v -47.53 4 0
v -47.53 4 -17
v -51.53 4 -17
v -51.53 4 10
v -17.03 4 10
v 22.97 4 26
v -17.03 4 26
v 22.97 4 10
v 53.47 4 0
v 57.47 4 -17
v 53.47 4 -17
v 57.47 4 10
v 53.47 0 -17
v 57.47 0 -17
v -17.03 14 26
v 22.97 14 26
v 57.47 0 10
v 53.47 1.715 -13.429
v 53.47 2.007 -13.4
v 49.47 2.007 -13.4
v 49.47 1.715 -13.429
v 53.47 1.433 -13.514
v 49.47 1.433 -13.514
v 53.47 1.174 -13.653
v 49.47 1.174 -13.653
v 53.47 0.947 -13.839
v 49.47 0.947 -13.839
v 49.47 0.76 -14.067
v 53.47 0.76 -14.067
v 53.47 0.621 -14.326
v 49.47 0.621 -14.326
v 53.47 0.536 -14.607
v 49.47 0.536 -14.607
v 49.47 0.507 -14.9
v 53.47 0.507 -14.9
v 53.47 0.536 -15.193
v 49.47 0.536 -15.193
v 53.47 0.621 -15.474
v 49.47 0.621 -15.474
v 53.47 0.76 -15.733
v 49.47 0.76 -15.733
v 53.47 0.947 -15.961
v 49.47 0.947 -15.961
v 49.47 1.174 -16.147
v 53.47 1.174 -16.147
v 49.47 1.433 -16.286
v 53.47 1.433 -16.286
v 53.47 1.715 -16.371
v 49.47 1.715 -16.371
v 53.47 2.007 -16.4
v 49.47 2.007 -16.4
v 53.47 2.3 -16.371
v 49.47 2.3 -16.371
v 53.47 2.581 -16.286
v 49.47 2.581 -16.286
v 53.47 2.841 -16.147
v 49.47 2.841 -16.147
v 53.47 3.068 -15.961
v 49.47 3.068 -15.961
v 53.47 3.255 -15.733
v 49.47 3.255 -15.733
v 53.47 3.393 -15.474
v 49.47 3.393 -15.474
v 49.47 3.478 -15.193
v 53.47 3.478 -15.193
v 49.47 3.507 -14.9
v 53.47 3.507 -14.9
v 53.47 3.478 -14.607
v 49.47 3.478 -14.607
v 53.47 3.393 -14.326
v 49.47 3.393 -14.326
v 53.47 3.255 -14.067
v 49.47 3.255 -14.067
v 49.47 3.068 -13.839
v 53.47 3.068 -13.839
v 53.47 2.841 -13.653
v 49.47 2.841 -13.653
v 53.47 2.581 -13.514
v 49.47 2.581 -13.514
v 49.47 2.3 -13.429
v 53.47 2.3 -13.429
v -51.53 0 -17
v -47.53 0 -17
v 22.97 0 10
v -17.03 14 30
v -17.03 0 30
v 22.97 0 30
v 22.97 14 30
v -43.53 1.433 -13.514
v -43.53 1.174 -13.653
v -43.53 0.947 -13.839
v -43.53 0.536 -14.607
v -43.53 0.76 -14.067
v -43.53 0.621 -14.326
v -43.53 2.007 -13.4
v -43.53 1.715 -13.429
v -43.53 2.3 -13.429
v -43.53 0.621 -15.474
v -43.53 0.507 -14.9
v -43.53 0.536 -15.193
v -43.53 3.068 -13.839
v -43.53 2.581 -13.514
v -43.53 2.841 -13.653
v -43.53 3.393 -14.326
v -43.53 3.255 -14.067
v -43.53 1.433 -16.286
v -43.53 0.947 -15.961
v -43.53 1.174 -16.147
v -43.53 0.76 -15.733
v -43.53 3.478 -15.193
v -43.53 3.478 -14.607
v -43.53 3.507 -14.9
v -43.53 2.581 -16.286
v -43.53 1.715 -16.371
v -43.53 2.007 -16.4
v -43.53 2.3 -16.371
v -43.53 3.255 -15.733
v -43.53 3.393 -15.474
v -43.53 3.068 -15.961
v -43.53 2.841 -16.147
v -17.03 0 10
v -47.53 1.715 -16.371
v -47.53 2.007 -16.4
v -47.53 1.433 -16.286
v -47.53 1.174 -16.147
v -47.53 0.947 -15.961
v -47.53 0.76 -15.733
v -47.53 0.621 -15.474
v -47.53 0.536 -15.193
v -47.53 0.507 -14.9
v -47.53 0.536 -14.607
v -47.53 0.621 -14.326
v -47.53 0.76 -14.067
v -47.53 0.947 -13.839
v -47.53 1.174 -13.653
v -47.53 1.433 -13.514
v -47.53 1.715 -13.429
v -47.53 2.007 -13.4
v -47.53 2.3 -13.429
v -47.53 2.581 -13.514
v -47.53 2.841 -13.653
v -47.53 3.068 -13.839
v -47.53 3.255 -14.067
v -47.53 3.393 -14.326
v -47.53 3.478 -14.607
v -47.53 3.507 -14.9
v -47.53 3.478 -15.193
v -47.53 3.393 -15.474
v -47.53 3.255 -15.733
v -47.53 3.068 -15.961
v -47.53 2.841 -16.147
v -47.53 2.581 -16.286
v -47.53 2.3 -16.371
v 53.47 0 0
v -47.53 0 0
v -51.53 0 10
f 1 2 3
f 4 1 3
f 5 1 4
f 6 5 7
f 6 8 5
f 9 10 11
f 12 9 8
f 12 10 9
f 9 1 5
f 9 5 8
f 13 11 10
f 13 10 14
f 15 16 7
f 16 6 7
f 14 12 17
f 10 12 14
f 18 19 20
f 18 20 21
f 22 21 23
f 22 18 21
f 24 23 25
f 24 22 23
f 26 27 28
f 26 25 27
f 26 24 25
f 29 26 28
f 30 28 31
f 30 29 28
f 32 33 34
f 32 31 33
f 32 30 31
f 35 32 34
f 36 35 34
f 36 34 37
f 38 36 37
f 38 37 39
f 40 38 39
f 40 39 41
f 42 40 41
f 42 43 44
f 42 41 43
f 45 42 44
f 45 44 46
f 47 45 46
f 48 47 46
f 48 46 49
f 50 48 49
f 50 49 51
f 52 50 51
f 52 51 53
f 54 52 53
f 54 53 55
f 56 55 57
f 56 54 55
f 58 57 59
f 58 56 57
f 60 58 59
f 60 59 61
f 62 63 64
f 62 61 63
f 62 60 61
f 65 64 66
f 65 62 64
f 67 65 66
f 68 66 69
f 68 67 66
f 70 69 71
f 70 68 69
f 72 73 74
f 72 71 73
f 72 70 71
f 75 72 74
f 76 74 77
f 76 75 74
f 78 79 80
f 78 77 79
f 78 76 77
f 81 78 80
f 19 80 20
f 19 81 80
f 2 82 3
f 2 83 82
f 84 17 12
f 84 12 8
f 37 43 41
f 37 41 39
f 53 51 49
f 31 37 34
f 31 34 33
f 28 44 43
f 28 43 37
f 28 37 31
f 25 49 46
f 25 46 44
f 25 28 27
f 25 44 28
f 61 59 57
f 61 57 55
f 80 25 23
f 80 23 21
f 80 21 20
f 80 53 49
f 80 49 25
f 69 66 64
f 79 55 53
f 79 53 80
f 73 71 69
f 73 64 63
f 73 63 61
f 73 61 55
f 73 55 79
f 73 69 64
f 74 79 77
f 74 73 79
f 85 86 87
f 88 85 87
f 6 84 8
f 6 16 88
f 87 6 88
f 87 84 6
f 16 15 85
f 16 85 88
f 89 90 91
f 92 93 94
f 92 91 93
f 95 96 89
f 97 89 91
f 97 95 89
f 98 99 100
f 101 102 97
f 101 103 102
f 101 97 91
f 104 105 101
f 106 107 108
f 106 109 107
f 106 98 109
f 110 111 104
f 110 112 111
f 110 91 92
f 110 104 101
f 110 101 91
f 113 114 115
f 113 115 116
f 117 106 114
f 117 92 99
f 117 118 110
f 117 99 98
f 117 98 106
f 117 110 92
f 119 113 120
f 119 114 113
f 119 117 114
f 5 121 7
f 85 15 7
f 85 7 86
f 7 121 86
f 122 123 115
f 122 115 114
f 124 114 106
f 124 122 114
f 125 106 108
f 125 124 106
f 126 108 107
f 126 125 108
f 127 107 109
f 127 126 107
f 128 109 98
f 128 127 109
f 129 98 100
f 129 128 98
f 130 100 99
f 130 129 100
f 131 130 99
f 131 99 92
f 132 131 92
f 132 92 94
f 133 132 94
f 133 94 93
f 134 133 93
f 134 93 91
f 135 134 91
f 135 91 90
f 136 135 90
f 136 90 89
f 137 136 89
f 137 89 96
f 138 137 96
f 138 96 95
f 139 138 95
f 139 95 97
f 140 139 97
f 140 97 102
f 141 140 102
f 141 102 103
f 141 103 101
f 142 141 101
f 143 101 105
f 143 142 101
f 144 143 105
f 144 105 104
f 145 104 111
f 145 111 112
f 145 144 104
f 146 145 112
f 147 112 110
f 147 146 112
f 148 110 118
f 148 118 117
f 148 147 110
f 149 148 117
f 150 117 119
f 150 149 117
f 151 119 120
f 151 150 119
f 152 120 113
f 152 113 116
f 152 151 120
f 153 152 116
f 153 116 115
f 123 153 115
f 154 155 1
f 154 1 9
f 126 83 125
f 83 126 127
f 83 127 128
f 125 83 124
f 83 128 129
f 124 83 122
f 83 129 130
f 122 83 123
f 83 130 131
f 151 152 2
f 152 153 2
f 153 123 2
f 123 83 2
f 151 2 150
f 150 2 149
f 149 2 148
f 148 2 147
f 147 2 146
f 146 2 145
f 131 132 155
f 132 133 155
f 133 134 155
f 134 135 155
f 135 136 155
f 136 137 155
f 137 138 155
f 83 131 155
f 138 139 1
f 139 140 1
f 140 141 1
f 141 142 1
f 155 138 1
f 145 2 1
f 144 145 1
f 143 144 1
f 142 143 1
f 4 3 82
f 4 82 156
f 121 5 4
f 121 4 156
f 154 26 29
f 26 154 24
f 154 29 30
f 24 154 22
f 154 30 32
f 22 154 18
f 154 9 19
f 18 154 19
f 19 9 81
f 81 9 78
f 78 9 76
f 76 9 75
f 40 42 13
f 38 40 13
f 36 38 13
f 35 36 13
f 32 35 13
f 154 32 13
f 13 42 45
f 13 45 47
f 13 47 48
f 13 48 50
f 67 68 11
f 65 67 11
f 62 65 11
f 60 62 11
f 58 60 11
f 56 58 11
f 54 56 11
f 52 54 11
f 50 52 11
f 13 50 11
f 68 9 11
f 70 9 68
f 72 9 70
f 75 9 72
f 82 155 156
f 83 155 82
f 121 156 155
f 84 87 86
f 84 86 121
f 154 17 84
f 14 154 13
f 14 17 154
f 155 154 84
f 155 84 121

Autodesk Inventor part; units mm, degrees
ref_plane "YZ Plane" through (0, 0, 0) normal (1, 0, 0) x (0, 1, 0)
ref_plane "XZ Plane" through (0, 0, 0) normal (0, 1, 0) x (-1, 0, 0)
ref_plane "XY Plane" through (0, 0, 0) normal (0, 0, 1) x (1, 0, 0)
sketch "Эскиз1" plane through (0, 0, 0) normal (0, 1, 0) x (-1, 0, 0)
  line L0 (0, 0) -> (47.5295, 0)
  line L1 (0, 0) -> (-53.4705, 0)
  line L2 (47.5295, 0) -> (-53.4705, 0)
  line L3 (-53.4705, 0) -> (-53.4705, 10)
  line L4 (-53.4705, 10) -> (47.5295, 10)
  line L5 (47.5295, 10) -> (47.5295, 0)
  dimension "d0" = 101
  dimension "d1" = 10
extrude "Выдавливание1" add sketch "Эскиз1" along normal blind 4
sketch "Эскиз2" plane through (-47.5295, 0, 10) normal (0, 0, 1) x (1, 0, 0)
  line L0 (0, 4) -> (101, 4) projected
  line L1 (0, 4) -> (50.5, 4)
  line L2 (30.5, 0) -> (70.5, 0)
  line L3 (70.5, 0) -> (70.5, 4)
  line L4 (70.5, 4) -> (30.5, 4)
  line L5 (30.5, 4) -> (30.5, 0)
  line L6 (30.5, 0) -> (70.5, 4) construction
  line L7 (70.5, 0) -> (30.5, 4) construction
  point P0 (47.5295, 0)
  point P1 (50.5, 2)
  point P2 (30.5, 2)
  point P3 (70.5, 2)
  dimension "d4" = 50.5
  dimension "d5" = 40
  dimension "d6" = 4
extrude "Выдавливание2" add sketch "Эскиз2" along normal blind 20
sketch "Эскиз3" plane through (0, 4, 0) normal (0, 1, 0) x (1, 0, 0)
  line L0 (-17.0295, -30) -> (22.9705, -30) projected
  line L1 (22.9705, -10) -> (22.9705, -30) projected
  line L2 (-17.0295, -30) -> (22.9705, -30)
  line L3 (22.9705, -30) -> (22.9705, -26)
  line L4 (22.9705, -26) -> (-17.0295, -26)
  line L5 (-17.0295, -26) -> (-17.0295, -30)
  point P0 (0, 0)
  dimension "d9" = 4
extrude "Выдавливание3" add sketch "Эскиз3" along normal blind 10
sketch "Эскиз4" plane through (53.4705, 0, 10) normal (1, 0, 0) x (0, 0, -1)
  line L0 (0, 4) -> (10, 4) projected
  line L1 (0, 4) -> (27, 4)
  line L2 (27, 4) -> (27, 0)
  line L3 (27, 0) -> (0, 0)
  line L4 (0, 0) -> (0, 4)
  line L5 (10, 0) -> (10, 4) projected
  dimension "d12" = 17
extrude "Выдавливание4" add sketch "Эскиз4" along normal blind 4
sketch "Эскиз5" plane through (-47.5295, 0, 0) normal (-1, 0, 0) x (0, 0, 1)
  line L0 (-17, 4) -> (0, 4) projected
  line L1 (10, 0) -> (-17, 0)
  line L2 (-17, 0) -> (-17, 4)
  line L3 (-17, 4) -> (10, 4)
  line L4 (10, 4) -> (10, 0)
  point P0 (0, 0)
  point P1 (0, 4)
extrude "Выдавливание5" add sketch "Эскиз5" along normal blind 4
sketch "Эскиз6" plane through (-47.5295, 0, 0) normal (1, 0, 0) x (0, 0, -1)
  circle A0 centre (14.9, 2.0073) radius 1.5
  line L0 (14.9, 2.0073) -> (17, 2)
  line L1 (17, 4) -> (17, 0) projected
  point P0 (0, 0)
  dimension "d17" = 3
  dimension "d18" = 2.1
extrude "Выдавливание6" add sketch "Эскиз6" along normal blind 4
sketch "Эскиз7" plane through (53.4705, 0, 10) normal (-1, 0, 0) x (0, 0, 1)
  circle A0 centre (-24.9, 2.0073) radius 1.5 projected
  circle A1 centre (-24.9, 2.0073) radius 1.5
  point P0 (-10, 0)
extrude "Выдавливание7" add sketch "Эскиз7" along normal blind 4
properties part number "крюк"
